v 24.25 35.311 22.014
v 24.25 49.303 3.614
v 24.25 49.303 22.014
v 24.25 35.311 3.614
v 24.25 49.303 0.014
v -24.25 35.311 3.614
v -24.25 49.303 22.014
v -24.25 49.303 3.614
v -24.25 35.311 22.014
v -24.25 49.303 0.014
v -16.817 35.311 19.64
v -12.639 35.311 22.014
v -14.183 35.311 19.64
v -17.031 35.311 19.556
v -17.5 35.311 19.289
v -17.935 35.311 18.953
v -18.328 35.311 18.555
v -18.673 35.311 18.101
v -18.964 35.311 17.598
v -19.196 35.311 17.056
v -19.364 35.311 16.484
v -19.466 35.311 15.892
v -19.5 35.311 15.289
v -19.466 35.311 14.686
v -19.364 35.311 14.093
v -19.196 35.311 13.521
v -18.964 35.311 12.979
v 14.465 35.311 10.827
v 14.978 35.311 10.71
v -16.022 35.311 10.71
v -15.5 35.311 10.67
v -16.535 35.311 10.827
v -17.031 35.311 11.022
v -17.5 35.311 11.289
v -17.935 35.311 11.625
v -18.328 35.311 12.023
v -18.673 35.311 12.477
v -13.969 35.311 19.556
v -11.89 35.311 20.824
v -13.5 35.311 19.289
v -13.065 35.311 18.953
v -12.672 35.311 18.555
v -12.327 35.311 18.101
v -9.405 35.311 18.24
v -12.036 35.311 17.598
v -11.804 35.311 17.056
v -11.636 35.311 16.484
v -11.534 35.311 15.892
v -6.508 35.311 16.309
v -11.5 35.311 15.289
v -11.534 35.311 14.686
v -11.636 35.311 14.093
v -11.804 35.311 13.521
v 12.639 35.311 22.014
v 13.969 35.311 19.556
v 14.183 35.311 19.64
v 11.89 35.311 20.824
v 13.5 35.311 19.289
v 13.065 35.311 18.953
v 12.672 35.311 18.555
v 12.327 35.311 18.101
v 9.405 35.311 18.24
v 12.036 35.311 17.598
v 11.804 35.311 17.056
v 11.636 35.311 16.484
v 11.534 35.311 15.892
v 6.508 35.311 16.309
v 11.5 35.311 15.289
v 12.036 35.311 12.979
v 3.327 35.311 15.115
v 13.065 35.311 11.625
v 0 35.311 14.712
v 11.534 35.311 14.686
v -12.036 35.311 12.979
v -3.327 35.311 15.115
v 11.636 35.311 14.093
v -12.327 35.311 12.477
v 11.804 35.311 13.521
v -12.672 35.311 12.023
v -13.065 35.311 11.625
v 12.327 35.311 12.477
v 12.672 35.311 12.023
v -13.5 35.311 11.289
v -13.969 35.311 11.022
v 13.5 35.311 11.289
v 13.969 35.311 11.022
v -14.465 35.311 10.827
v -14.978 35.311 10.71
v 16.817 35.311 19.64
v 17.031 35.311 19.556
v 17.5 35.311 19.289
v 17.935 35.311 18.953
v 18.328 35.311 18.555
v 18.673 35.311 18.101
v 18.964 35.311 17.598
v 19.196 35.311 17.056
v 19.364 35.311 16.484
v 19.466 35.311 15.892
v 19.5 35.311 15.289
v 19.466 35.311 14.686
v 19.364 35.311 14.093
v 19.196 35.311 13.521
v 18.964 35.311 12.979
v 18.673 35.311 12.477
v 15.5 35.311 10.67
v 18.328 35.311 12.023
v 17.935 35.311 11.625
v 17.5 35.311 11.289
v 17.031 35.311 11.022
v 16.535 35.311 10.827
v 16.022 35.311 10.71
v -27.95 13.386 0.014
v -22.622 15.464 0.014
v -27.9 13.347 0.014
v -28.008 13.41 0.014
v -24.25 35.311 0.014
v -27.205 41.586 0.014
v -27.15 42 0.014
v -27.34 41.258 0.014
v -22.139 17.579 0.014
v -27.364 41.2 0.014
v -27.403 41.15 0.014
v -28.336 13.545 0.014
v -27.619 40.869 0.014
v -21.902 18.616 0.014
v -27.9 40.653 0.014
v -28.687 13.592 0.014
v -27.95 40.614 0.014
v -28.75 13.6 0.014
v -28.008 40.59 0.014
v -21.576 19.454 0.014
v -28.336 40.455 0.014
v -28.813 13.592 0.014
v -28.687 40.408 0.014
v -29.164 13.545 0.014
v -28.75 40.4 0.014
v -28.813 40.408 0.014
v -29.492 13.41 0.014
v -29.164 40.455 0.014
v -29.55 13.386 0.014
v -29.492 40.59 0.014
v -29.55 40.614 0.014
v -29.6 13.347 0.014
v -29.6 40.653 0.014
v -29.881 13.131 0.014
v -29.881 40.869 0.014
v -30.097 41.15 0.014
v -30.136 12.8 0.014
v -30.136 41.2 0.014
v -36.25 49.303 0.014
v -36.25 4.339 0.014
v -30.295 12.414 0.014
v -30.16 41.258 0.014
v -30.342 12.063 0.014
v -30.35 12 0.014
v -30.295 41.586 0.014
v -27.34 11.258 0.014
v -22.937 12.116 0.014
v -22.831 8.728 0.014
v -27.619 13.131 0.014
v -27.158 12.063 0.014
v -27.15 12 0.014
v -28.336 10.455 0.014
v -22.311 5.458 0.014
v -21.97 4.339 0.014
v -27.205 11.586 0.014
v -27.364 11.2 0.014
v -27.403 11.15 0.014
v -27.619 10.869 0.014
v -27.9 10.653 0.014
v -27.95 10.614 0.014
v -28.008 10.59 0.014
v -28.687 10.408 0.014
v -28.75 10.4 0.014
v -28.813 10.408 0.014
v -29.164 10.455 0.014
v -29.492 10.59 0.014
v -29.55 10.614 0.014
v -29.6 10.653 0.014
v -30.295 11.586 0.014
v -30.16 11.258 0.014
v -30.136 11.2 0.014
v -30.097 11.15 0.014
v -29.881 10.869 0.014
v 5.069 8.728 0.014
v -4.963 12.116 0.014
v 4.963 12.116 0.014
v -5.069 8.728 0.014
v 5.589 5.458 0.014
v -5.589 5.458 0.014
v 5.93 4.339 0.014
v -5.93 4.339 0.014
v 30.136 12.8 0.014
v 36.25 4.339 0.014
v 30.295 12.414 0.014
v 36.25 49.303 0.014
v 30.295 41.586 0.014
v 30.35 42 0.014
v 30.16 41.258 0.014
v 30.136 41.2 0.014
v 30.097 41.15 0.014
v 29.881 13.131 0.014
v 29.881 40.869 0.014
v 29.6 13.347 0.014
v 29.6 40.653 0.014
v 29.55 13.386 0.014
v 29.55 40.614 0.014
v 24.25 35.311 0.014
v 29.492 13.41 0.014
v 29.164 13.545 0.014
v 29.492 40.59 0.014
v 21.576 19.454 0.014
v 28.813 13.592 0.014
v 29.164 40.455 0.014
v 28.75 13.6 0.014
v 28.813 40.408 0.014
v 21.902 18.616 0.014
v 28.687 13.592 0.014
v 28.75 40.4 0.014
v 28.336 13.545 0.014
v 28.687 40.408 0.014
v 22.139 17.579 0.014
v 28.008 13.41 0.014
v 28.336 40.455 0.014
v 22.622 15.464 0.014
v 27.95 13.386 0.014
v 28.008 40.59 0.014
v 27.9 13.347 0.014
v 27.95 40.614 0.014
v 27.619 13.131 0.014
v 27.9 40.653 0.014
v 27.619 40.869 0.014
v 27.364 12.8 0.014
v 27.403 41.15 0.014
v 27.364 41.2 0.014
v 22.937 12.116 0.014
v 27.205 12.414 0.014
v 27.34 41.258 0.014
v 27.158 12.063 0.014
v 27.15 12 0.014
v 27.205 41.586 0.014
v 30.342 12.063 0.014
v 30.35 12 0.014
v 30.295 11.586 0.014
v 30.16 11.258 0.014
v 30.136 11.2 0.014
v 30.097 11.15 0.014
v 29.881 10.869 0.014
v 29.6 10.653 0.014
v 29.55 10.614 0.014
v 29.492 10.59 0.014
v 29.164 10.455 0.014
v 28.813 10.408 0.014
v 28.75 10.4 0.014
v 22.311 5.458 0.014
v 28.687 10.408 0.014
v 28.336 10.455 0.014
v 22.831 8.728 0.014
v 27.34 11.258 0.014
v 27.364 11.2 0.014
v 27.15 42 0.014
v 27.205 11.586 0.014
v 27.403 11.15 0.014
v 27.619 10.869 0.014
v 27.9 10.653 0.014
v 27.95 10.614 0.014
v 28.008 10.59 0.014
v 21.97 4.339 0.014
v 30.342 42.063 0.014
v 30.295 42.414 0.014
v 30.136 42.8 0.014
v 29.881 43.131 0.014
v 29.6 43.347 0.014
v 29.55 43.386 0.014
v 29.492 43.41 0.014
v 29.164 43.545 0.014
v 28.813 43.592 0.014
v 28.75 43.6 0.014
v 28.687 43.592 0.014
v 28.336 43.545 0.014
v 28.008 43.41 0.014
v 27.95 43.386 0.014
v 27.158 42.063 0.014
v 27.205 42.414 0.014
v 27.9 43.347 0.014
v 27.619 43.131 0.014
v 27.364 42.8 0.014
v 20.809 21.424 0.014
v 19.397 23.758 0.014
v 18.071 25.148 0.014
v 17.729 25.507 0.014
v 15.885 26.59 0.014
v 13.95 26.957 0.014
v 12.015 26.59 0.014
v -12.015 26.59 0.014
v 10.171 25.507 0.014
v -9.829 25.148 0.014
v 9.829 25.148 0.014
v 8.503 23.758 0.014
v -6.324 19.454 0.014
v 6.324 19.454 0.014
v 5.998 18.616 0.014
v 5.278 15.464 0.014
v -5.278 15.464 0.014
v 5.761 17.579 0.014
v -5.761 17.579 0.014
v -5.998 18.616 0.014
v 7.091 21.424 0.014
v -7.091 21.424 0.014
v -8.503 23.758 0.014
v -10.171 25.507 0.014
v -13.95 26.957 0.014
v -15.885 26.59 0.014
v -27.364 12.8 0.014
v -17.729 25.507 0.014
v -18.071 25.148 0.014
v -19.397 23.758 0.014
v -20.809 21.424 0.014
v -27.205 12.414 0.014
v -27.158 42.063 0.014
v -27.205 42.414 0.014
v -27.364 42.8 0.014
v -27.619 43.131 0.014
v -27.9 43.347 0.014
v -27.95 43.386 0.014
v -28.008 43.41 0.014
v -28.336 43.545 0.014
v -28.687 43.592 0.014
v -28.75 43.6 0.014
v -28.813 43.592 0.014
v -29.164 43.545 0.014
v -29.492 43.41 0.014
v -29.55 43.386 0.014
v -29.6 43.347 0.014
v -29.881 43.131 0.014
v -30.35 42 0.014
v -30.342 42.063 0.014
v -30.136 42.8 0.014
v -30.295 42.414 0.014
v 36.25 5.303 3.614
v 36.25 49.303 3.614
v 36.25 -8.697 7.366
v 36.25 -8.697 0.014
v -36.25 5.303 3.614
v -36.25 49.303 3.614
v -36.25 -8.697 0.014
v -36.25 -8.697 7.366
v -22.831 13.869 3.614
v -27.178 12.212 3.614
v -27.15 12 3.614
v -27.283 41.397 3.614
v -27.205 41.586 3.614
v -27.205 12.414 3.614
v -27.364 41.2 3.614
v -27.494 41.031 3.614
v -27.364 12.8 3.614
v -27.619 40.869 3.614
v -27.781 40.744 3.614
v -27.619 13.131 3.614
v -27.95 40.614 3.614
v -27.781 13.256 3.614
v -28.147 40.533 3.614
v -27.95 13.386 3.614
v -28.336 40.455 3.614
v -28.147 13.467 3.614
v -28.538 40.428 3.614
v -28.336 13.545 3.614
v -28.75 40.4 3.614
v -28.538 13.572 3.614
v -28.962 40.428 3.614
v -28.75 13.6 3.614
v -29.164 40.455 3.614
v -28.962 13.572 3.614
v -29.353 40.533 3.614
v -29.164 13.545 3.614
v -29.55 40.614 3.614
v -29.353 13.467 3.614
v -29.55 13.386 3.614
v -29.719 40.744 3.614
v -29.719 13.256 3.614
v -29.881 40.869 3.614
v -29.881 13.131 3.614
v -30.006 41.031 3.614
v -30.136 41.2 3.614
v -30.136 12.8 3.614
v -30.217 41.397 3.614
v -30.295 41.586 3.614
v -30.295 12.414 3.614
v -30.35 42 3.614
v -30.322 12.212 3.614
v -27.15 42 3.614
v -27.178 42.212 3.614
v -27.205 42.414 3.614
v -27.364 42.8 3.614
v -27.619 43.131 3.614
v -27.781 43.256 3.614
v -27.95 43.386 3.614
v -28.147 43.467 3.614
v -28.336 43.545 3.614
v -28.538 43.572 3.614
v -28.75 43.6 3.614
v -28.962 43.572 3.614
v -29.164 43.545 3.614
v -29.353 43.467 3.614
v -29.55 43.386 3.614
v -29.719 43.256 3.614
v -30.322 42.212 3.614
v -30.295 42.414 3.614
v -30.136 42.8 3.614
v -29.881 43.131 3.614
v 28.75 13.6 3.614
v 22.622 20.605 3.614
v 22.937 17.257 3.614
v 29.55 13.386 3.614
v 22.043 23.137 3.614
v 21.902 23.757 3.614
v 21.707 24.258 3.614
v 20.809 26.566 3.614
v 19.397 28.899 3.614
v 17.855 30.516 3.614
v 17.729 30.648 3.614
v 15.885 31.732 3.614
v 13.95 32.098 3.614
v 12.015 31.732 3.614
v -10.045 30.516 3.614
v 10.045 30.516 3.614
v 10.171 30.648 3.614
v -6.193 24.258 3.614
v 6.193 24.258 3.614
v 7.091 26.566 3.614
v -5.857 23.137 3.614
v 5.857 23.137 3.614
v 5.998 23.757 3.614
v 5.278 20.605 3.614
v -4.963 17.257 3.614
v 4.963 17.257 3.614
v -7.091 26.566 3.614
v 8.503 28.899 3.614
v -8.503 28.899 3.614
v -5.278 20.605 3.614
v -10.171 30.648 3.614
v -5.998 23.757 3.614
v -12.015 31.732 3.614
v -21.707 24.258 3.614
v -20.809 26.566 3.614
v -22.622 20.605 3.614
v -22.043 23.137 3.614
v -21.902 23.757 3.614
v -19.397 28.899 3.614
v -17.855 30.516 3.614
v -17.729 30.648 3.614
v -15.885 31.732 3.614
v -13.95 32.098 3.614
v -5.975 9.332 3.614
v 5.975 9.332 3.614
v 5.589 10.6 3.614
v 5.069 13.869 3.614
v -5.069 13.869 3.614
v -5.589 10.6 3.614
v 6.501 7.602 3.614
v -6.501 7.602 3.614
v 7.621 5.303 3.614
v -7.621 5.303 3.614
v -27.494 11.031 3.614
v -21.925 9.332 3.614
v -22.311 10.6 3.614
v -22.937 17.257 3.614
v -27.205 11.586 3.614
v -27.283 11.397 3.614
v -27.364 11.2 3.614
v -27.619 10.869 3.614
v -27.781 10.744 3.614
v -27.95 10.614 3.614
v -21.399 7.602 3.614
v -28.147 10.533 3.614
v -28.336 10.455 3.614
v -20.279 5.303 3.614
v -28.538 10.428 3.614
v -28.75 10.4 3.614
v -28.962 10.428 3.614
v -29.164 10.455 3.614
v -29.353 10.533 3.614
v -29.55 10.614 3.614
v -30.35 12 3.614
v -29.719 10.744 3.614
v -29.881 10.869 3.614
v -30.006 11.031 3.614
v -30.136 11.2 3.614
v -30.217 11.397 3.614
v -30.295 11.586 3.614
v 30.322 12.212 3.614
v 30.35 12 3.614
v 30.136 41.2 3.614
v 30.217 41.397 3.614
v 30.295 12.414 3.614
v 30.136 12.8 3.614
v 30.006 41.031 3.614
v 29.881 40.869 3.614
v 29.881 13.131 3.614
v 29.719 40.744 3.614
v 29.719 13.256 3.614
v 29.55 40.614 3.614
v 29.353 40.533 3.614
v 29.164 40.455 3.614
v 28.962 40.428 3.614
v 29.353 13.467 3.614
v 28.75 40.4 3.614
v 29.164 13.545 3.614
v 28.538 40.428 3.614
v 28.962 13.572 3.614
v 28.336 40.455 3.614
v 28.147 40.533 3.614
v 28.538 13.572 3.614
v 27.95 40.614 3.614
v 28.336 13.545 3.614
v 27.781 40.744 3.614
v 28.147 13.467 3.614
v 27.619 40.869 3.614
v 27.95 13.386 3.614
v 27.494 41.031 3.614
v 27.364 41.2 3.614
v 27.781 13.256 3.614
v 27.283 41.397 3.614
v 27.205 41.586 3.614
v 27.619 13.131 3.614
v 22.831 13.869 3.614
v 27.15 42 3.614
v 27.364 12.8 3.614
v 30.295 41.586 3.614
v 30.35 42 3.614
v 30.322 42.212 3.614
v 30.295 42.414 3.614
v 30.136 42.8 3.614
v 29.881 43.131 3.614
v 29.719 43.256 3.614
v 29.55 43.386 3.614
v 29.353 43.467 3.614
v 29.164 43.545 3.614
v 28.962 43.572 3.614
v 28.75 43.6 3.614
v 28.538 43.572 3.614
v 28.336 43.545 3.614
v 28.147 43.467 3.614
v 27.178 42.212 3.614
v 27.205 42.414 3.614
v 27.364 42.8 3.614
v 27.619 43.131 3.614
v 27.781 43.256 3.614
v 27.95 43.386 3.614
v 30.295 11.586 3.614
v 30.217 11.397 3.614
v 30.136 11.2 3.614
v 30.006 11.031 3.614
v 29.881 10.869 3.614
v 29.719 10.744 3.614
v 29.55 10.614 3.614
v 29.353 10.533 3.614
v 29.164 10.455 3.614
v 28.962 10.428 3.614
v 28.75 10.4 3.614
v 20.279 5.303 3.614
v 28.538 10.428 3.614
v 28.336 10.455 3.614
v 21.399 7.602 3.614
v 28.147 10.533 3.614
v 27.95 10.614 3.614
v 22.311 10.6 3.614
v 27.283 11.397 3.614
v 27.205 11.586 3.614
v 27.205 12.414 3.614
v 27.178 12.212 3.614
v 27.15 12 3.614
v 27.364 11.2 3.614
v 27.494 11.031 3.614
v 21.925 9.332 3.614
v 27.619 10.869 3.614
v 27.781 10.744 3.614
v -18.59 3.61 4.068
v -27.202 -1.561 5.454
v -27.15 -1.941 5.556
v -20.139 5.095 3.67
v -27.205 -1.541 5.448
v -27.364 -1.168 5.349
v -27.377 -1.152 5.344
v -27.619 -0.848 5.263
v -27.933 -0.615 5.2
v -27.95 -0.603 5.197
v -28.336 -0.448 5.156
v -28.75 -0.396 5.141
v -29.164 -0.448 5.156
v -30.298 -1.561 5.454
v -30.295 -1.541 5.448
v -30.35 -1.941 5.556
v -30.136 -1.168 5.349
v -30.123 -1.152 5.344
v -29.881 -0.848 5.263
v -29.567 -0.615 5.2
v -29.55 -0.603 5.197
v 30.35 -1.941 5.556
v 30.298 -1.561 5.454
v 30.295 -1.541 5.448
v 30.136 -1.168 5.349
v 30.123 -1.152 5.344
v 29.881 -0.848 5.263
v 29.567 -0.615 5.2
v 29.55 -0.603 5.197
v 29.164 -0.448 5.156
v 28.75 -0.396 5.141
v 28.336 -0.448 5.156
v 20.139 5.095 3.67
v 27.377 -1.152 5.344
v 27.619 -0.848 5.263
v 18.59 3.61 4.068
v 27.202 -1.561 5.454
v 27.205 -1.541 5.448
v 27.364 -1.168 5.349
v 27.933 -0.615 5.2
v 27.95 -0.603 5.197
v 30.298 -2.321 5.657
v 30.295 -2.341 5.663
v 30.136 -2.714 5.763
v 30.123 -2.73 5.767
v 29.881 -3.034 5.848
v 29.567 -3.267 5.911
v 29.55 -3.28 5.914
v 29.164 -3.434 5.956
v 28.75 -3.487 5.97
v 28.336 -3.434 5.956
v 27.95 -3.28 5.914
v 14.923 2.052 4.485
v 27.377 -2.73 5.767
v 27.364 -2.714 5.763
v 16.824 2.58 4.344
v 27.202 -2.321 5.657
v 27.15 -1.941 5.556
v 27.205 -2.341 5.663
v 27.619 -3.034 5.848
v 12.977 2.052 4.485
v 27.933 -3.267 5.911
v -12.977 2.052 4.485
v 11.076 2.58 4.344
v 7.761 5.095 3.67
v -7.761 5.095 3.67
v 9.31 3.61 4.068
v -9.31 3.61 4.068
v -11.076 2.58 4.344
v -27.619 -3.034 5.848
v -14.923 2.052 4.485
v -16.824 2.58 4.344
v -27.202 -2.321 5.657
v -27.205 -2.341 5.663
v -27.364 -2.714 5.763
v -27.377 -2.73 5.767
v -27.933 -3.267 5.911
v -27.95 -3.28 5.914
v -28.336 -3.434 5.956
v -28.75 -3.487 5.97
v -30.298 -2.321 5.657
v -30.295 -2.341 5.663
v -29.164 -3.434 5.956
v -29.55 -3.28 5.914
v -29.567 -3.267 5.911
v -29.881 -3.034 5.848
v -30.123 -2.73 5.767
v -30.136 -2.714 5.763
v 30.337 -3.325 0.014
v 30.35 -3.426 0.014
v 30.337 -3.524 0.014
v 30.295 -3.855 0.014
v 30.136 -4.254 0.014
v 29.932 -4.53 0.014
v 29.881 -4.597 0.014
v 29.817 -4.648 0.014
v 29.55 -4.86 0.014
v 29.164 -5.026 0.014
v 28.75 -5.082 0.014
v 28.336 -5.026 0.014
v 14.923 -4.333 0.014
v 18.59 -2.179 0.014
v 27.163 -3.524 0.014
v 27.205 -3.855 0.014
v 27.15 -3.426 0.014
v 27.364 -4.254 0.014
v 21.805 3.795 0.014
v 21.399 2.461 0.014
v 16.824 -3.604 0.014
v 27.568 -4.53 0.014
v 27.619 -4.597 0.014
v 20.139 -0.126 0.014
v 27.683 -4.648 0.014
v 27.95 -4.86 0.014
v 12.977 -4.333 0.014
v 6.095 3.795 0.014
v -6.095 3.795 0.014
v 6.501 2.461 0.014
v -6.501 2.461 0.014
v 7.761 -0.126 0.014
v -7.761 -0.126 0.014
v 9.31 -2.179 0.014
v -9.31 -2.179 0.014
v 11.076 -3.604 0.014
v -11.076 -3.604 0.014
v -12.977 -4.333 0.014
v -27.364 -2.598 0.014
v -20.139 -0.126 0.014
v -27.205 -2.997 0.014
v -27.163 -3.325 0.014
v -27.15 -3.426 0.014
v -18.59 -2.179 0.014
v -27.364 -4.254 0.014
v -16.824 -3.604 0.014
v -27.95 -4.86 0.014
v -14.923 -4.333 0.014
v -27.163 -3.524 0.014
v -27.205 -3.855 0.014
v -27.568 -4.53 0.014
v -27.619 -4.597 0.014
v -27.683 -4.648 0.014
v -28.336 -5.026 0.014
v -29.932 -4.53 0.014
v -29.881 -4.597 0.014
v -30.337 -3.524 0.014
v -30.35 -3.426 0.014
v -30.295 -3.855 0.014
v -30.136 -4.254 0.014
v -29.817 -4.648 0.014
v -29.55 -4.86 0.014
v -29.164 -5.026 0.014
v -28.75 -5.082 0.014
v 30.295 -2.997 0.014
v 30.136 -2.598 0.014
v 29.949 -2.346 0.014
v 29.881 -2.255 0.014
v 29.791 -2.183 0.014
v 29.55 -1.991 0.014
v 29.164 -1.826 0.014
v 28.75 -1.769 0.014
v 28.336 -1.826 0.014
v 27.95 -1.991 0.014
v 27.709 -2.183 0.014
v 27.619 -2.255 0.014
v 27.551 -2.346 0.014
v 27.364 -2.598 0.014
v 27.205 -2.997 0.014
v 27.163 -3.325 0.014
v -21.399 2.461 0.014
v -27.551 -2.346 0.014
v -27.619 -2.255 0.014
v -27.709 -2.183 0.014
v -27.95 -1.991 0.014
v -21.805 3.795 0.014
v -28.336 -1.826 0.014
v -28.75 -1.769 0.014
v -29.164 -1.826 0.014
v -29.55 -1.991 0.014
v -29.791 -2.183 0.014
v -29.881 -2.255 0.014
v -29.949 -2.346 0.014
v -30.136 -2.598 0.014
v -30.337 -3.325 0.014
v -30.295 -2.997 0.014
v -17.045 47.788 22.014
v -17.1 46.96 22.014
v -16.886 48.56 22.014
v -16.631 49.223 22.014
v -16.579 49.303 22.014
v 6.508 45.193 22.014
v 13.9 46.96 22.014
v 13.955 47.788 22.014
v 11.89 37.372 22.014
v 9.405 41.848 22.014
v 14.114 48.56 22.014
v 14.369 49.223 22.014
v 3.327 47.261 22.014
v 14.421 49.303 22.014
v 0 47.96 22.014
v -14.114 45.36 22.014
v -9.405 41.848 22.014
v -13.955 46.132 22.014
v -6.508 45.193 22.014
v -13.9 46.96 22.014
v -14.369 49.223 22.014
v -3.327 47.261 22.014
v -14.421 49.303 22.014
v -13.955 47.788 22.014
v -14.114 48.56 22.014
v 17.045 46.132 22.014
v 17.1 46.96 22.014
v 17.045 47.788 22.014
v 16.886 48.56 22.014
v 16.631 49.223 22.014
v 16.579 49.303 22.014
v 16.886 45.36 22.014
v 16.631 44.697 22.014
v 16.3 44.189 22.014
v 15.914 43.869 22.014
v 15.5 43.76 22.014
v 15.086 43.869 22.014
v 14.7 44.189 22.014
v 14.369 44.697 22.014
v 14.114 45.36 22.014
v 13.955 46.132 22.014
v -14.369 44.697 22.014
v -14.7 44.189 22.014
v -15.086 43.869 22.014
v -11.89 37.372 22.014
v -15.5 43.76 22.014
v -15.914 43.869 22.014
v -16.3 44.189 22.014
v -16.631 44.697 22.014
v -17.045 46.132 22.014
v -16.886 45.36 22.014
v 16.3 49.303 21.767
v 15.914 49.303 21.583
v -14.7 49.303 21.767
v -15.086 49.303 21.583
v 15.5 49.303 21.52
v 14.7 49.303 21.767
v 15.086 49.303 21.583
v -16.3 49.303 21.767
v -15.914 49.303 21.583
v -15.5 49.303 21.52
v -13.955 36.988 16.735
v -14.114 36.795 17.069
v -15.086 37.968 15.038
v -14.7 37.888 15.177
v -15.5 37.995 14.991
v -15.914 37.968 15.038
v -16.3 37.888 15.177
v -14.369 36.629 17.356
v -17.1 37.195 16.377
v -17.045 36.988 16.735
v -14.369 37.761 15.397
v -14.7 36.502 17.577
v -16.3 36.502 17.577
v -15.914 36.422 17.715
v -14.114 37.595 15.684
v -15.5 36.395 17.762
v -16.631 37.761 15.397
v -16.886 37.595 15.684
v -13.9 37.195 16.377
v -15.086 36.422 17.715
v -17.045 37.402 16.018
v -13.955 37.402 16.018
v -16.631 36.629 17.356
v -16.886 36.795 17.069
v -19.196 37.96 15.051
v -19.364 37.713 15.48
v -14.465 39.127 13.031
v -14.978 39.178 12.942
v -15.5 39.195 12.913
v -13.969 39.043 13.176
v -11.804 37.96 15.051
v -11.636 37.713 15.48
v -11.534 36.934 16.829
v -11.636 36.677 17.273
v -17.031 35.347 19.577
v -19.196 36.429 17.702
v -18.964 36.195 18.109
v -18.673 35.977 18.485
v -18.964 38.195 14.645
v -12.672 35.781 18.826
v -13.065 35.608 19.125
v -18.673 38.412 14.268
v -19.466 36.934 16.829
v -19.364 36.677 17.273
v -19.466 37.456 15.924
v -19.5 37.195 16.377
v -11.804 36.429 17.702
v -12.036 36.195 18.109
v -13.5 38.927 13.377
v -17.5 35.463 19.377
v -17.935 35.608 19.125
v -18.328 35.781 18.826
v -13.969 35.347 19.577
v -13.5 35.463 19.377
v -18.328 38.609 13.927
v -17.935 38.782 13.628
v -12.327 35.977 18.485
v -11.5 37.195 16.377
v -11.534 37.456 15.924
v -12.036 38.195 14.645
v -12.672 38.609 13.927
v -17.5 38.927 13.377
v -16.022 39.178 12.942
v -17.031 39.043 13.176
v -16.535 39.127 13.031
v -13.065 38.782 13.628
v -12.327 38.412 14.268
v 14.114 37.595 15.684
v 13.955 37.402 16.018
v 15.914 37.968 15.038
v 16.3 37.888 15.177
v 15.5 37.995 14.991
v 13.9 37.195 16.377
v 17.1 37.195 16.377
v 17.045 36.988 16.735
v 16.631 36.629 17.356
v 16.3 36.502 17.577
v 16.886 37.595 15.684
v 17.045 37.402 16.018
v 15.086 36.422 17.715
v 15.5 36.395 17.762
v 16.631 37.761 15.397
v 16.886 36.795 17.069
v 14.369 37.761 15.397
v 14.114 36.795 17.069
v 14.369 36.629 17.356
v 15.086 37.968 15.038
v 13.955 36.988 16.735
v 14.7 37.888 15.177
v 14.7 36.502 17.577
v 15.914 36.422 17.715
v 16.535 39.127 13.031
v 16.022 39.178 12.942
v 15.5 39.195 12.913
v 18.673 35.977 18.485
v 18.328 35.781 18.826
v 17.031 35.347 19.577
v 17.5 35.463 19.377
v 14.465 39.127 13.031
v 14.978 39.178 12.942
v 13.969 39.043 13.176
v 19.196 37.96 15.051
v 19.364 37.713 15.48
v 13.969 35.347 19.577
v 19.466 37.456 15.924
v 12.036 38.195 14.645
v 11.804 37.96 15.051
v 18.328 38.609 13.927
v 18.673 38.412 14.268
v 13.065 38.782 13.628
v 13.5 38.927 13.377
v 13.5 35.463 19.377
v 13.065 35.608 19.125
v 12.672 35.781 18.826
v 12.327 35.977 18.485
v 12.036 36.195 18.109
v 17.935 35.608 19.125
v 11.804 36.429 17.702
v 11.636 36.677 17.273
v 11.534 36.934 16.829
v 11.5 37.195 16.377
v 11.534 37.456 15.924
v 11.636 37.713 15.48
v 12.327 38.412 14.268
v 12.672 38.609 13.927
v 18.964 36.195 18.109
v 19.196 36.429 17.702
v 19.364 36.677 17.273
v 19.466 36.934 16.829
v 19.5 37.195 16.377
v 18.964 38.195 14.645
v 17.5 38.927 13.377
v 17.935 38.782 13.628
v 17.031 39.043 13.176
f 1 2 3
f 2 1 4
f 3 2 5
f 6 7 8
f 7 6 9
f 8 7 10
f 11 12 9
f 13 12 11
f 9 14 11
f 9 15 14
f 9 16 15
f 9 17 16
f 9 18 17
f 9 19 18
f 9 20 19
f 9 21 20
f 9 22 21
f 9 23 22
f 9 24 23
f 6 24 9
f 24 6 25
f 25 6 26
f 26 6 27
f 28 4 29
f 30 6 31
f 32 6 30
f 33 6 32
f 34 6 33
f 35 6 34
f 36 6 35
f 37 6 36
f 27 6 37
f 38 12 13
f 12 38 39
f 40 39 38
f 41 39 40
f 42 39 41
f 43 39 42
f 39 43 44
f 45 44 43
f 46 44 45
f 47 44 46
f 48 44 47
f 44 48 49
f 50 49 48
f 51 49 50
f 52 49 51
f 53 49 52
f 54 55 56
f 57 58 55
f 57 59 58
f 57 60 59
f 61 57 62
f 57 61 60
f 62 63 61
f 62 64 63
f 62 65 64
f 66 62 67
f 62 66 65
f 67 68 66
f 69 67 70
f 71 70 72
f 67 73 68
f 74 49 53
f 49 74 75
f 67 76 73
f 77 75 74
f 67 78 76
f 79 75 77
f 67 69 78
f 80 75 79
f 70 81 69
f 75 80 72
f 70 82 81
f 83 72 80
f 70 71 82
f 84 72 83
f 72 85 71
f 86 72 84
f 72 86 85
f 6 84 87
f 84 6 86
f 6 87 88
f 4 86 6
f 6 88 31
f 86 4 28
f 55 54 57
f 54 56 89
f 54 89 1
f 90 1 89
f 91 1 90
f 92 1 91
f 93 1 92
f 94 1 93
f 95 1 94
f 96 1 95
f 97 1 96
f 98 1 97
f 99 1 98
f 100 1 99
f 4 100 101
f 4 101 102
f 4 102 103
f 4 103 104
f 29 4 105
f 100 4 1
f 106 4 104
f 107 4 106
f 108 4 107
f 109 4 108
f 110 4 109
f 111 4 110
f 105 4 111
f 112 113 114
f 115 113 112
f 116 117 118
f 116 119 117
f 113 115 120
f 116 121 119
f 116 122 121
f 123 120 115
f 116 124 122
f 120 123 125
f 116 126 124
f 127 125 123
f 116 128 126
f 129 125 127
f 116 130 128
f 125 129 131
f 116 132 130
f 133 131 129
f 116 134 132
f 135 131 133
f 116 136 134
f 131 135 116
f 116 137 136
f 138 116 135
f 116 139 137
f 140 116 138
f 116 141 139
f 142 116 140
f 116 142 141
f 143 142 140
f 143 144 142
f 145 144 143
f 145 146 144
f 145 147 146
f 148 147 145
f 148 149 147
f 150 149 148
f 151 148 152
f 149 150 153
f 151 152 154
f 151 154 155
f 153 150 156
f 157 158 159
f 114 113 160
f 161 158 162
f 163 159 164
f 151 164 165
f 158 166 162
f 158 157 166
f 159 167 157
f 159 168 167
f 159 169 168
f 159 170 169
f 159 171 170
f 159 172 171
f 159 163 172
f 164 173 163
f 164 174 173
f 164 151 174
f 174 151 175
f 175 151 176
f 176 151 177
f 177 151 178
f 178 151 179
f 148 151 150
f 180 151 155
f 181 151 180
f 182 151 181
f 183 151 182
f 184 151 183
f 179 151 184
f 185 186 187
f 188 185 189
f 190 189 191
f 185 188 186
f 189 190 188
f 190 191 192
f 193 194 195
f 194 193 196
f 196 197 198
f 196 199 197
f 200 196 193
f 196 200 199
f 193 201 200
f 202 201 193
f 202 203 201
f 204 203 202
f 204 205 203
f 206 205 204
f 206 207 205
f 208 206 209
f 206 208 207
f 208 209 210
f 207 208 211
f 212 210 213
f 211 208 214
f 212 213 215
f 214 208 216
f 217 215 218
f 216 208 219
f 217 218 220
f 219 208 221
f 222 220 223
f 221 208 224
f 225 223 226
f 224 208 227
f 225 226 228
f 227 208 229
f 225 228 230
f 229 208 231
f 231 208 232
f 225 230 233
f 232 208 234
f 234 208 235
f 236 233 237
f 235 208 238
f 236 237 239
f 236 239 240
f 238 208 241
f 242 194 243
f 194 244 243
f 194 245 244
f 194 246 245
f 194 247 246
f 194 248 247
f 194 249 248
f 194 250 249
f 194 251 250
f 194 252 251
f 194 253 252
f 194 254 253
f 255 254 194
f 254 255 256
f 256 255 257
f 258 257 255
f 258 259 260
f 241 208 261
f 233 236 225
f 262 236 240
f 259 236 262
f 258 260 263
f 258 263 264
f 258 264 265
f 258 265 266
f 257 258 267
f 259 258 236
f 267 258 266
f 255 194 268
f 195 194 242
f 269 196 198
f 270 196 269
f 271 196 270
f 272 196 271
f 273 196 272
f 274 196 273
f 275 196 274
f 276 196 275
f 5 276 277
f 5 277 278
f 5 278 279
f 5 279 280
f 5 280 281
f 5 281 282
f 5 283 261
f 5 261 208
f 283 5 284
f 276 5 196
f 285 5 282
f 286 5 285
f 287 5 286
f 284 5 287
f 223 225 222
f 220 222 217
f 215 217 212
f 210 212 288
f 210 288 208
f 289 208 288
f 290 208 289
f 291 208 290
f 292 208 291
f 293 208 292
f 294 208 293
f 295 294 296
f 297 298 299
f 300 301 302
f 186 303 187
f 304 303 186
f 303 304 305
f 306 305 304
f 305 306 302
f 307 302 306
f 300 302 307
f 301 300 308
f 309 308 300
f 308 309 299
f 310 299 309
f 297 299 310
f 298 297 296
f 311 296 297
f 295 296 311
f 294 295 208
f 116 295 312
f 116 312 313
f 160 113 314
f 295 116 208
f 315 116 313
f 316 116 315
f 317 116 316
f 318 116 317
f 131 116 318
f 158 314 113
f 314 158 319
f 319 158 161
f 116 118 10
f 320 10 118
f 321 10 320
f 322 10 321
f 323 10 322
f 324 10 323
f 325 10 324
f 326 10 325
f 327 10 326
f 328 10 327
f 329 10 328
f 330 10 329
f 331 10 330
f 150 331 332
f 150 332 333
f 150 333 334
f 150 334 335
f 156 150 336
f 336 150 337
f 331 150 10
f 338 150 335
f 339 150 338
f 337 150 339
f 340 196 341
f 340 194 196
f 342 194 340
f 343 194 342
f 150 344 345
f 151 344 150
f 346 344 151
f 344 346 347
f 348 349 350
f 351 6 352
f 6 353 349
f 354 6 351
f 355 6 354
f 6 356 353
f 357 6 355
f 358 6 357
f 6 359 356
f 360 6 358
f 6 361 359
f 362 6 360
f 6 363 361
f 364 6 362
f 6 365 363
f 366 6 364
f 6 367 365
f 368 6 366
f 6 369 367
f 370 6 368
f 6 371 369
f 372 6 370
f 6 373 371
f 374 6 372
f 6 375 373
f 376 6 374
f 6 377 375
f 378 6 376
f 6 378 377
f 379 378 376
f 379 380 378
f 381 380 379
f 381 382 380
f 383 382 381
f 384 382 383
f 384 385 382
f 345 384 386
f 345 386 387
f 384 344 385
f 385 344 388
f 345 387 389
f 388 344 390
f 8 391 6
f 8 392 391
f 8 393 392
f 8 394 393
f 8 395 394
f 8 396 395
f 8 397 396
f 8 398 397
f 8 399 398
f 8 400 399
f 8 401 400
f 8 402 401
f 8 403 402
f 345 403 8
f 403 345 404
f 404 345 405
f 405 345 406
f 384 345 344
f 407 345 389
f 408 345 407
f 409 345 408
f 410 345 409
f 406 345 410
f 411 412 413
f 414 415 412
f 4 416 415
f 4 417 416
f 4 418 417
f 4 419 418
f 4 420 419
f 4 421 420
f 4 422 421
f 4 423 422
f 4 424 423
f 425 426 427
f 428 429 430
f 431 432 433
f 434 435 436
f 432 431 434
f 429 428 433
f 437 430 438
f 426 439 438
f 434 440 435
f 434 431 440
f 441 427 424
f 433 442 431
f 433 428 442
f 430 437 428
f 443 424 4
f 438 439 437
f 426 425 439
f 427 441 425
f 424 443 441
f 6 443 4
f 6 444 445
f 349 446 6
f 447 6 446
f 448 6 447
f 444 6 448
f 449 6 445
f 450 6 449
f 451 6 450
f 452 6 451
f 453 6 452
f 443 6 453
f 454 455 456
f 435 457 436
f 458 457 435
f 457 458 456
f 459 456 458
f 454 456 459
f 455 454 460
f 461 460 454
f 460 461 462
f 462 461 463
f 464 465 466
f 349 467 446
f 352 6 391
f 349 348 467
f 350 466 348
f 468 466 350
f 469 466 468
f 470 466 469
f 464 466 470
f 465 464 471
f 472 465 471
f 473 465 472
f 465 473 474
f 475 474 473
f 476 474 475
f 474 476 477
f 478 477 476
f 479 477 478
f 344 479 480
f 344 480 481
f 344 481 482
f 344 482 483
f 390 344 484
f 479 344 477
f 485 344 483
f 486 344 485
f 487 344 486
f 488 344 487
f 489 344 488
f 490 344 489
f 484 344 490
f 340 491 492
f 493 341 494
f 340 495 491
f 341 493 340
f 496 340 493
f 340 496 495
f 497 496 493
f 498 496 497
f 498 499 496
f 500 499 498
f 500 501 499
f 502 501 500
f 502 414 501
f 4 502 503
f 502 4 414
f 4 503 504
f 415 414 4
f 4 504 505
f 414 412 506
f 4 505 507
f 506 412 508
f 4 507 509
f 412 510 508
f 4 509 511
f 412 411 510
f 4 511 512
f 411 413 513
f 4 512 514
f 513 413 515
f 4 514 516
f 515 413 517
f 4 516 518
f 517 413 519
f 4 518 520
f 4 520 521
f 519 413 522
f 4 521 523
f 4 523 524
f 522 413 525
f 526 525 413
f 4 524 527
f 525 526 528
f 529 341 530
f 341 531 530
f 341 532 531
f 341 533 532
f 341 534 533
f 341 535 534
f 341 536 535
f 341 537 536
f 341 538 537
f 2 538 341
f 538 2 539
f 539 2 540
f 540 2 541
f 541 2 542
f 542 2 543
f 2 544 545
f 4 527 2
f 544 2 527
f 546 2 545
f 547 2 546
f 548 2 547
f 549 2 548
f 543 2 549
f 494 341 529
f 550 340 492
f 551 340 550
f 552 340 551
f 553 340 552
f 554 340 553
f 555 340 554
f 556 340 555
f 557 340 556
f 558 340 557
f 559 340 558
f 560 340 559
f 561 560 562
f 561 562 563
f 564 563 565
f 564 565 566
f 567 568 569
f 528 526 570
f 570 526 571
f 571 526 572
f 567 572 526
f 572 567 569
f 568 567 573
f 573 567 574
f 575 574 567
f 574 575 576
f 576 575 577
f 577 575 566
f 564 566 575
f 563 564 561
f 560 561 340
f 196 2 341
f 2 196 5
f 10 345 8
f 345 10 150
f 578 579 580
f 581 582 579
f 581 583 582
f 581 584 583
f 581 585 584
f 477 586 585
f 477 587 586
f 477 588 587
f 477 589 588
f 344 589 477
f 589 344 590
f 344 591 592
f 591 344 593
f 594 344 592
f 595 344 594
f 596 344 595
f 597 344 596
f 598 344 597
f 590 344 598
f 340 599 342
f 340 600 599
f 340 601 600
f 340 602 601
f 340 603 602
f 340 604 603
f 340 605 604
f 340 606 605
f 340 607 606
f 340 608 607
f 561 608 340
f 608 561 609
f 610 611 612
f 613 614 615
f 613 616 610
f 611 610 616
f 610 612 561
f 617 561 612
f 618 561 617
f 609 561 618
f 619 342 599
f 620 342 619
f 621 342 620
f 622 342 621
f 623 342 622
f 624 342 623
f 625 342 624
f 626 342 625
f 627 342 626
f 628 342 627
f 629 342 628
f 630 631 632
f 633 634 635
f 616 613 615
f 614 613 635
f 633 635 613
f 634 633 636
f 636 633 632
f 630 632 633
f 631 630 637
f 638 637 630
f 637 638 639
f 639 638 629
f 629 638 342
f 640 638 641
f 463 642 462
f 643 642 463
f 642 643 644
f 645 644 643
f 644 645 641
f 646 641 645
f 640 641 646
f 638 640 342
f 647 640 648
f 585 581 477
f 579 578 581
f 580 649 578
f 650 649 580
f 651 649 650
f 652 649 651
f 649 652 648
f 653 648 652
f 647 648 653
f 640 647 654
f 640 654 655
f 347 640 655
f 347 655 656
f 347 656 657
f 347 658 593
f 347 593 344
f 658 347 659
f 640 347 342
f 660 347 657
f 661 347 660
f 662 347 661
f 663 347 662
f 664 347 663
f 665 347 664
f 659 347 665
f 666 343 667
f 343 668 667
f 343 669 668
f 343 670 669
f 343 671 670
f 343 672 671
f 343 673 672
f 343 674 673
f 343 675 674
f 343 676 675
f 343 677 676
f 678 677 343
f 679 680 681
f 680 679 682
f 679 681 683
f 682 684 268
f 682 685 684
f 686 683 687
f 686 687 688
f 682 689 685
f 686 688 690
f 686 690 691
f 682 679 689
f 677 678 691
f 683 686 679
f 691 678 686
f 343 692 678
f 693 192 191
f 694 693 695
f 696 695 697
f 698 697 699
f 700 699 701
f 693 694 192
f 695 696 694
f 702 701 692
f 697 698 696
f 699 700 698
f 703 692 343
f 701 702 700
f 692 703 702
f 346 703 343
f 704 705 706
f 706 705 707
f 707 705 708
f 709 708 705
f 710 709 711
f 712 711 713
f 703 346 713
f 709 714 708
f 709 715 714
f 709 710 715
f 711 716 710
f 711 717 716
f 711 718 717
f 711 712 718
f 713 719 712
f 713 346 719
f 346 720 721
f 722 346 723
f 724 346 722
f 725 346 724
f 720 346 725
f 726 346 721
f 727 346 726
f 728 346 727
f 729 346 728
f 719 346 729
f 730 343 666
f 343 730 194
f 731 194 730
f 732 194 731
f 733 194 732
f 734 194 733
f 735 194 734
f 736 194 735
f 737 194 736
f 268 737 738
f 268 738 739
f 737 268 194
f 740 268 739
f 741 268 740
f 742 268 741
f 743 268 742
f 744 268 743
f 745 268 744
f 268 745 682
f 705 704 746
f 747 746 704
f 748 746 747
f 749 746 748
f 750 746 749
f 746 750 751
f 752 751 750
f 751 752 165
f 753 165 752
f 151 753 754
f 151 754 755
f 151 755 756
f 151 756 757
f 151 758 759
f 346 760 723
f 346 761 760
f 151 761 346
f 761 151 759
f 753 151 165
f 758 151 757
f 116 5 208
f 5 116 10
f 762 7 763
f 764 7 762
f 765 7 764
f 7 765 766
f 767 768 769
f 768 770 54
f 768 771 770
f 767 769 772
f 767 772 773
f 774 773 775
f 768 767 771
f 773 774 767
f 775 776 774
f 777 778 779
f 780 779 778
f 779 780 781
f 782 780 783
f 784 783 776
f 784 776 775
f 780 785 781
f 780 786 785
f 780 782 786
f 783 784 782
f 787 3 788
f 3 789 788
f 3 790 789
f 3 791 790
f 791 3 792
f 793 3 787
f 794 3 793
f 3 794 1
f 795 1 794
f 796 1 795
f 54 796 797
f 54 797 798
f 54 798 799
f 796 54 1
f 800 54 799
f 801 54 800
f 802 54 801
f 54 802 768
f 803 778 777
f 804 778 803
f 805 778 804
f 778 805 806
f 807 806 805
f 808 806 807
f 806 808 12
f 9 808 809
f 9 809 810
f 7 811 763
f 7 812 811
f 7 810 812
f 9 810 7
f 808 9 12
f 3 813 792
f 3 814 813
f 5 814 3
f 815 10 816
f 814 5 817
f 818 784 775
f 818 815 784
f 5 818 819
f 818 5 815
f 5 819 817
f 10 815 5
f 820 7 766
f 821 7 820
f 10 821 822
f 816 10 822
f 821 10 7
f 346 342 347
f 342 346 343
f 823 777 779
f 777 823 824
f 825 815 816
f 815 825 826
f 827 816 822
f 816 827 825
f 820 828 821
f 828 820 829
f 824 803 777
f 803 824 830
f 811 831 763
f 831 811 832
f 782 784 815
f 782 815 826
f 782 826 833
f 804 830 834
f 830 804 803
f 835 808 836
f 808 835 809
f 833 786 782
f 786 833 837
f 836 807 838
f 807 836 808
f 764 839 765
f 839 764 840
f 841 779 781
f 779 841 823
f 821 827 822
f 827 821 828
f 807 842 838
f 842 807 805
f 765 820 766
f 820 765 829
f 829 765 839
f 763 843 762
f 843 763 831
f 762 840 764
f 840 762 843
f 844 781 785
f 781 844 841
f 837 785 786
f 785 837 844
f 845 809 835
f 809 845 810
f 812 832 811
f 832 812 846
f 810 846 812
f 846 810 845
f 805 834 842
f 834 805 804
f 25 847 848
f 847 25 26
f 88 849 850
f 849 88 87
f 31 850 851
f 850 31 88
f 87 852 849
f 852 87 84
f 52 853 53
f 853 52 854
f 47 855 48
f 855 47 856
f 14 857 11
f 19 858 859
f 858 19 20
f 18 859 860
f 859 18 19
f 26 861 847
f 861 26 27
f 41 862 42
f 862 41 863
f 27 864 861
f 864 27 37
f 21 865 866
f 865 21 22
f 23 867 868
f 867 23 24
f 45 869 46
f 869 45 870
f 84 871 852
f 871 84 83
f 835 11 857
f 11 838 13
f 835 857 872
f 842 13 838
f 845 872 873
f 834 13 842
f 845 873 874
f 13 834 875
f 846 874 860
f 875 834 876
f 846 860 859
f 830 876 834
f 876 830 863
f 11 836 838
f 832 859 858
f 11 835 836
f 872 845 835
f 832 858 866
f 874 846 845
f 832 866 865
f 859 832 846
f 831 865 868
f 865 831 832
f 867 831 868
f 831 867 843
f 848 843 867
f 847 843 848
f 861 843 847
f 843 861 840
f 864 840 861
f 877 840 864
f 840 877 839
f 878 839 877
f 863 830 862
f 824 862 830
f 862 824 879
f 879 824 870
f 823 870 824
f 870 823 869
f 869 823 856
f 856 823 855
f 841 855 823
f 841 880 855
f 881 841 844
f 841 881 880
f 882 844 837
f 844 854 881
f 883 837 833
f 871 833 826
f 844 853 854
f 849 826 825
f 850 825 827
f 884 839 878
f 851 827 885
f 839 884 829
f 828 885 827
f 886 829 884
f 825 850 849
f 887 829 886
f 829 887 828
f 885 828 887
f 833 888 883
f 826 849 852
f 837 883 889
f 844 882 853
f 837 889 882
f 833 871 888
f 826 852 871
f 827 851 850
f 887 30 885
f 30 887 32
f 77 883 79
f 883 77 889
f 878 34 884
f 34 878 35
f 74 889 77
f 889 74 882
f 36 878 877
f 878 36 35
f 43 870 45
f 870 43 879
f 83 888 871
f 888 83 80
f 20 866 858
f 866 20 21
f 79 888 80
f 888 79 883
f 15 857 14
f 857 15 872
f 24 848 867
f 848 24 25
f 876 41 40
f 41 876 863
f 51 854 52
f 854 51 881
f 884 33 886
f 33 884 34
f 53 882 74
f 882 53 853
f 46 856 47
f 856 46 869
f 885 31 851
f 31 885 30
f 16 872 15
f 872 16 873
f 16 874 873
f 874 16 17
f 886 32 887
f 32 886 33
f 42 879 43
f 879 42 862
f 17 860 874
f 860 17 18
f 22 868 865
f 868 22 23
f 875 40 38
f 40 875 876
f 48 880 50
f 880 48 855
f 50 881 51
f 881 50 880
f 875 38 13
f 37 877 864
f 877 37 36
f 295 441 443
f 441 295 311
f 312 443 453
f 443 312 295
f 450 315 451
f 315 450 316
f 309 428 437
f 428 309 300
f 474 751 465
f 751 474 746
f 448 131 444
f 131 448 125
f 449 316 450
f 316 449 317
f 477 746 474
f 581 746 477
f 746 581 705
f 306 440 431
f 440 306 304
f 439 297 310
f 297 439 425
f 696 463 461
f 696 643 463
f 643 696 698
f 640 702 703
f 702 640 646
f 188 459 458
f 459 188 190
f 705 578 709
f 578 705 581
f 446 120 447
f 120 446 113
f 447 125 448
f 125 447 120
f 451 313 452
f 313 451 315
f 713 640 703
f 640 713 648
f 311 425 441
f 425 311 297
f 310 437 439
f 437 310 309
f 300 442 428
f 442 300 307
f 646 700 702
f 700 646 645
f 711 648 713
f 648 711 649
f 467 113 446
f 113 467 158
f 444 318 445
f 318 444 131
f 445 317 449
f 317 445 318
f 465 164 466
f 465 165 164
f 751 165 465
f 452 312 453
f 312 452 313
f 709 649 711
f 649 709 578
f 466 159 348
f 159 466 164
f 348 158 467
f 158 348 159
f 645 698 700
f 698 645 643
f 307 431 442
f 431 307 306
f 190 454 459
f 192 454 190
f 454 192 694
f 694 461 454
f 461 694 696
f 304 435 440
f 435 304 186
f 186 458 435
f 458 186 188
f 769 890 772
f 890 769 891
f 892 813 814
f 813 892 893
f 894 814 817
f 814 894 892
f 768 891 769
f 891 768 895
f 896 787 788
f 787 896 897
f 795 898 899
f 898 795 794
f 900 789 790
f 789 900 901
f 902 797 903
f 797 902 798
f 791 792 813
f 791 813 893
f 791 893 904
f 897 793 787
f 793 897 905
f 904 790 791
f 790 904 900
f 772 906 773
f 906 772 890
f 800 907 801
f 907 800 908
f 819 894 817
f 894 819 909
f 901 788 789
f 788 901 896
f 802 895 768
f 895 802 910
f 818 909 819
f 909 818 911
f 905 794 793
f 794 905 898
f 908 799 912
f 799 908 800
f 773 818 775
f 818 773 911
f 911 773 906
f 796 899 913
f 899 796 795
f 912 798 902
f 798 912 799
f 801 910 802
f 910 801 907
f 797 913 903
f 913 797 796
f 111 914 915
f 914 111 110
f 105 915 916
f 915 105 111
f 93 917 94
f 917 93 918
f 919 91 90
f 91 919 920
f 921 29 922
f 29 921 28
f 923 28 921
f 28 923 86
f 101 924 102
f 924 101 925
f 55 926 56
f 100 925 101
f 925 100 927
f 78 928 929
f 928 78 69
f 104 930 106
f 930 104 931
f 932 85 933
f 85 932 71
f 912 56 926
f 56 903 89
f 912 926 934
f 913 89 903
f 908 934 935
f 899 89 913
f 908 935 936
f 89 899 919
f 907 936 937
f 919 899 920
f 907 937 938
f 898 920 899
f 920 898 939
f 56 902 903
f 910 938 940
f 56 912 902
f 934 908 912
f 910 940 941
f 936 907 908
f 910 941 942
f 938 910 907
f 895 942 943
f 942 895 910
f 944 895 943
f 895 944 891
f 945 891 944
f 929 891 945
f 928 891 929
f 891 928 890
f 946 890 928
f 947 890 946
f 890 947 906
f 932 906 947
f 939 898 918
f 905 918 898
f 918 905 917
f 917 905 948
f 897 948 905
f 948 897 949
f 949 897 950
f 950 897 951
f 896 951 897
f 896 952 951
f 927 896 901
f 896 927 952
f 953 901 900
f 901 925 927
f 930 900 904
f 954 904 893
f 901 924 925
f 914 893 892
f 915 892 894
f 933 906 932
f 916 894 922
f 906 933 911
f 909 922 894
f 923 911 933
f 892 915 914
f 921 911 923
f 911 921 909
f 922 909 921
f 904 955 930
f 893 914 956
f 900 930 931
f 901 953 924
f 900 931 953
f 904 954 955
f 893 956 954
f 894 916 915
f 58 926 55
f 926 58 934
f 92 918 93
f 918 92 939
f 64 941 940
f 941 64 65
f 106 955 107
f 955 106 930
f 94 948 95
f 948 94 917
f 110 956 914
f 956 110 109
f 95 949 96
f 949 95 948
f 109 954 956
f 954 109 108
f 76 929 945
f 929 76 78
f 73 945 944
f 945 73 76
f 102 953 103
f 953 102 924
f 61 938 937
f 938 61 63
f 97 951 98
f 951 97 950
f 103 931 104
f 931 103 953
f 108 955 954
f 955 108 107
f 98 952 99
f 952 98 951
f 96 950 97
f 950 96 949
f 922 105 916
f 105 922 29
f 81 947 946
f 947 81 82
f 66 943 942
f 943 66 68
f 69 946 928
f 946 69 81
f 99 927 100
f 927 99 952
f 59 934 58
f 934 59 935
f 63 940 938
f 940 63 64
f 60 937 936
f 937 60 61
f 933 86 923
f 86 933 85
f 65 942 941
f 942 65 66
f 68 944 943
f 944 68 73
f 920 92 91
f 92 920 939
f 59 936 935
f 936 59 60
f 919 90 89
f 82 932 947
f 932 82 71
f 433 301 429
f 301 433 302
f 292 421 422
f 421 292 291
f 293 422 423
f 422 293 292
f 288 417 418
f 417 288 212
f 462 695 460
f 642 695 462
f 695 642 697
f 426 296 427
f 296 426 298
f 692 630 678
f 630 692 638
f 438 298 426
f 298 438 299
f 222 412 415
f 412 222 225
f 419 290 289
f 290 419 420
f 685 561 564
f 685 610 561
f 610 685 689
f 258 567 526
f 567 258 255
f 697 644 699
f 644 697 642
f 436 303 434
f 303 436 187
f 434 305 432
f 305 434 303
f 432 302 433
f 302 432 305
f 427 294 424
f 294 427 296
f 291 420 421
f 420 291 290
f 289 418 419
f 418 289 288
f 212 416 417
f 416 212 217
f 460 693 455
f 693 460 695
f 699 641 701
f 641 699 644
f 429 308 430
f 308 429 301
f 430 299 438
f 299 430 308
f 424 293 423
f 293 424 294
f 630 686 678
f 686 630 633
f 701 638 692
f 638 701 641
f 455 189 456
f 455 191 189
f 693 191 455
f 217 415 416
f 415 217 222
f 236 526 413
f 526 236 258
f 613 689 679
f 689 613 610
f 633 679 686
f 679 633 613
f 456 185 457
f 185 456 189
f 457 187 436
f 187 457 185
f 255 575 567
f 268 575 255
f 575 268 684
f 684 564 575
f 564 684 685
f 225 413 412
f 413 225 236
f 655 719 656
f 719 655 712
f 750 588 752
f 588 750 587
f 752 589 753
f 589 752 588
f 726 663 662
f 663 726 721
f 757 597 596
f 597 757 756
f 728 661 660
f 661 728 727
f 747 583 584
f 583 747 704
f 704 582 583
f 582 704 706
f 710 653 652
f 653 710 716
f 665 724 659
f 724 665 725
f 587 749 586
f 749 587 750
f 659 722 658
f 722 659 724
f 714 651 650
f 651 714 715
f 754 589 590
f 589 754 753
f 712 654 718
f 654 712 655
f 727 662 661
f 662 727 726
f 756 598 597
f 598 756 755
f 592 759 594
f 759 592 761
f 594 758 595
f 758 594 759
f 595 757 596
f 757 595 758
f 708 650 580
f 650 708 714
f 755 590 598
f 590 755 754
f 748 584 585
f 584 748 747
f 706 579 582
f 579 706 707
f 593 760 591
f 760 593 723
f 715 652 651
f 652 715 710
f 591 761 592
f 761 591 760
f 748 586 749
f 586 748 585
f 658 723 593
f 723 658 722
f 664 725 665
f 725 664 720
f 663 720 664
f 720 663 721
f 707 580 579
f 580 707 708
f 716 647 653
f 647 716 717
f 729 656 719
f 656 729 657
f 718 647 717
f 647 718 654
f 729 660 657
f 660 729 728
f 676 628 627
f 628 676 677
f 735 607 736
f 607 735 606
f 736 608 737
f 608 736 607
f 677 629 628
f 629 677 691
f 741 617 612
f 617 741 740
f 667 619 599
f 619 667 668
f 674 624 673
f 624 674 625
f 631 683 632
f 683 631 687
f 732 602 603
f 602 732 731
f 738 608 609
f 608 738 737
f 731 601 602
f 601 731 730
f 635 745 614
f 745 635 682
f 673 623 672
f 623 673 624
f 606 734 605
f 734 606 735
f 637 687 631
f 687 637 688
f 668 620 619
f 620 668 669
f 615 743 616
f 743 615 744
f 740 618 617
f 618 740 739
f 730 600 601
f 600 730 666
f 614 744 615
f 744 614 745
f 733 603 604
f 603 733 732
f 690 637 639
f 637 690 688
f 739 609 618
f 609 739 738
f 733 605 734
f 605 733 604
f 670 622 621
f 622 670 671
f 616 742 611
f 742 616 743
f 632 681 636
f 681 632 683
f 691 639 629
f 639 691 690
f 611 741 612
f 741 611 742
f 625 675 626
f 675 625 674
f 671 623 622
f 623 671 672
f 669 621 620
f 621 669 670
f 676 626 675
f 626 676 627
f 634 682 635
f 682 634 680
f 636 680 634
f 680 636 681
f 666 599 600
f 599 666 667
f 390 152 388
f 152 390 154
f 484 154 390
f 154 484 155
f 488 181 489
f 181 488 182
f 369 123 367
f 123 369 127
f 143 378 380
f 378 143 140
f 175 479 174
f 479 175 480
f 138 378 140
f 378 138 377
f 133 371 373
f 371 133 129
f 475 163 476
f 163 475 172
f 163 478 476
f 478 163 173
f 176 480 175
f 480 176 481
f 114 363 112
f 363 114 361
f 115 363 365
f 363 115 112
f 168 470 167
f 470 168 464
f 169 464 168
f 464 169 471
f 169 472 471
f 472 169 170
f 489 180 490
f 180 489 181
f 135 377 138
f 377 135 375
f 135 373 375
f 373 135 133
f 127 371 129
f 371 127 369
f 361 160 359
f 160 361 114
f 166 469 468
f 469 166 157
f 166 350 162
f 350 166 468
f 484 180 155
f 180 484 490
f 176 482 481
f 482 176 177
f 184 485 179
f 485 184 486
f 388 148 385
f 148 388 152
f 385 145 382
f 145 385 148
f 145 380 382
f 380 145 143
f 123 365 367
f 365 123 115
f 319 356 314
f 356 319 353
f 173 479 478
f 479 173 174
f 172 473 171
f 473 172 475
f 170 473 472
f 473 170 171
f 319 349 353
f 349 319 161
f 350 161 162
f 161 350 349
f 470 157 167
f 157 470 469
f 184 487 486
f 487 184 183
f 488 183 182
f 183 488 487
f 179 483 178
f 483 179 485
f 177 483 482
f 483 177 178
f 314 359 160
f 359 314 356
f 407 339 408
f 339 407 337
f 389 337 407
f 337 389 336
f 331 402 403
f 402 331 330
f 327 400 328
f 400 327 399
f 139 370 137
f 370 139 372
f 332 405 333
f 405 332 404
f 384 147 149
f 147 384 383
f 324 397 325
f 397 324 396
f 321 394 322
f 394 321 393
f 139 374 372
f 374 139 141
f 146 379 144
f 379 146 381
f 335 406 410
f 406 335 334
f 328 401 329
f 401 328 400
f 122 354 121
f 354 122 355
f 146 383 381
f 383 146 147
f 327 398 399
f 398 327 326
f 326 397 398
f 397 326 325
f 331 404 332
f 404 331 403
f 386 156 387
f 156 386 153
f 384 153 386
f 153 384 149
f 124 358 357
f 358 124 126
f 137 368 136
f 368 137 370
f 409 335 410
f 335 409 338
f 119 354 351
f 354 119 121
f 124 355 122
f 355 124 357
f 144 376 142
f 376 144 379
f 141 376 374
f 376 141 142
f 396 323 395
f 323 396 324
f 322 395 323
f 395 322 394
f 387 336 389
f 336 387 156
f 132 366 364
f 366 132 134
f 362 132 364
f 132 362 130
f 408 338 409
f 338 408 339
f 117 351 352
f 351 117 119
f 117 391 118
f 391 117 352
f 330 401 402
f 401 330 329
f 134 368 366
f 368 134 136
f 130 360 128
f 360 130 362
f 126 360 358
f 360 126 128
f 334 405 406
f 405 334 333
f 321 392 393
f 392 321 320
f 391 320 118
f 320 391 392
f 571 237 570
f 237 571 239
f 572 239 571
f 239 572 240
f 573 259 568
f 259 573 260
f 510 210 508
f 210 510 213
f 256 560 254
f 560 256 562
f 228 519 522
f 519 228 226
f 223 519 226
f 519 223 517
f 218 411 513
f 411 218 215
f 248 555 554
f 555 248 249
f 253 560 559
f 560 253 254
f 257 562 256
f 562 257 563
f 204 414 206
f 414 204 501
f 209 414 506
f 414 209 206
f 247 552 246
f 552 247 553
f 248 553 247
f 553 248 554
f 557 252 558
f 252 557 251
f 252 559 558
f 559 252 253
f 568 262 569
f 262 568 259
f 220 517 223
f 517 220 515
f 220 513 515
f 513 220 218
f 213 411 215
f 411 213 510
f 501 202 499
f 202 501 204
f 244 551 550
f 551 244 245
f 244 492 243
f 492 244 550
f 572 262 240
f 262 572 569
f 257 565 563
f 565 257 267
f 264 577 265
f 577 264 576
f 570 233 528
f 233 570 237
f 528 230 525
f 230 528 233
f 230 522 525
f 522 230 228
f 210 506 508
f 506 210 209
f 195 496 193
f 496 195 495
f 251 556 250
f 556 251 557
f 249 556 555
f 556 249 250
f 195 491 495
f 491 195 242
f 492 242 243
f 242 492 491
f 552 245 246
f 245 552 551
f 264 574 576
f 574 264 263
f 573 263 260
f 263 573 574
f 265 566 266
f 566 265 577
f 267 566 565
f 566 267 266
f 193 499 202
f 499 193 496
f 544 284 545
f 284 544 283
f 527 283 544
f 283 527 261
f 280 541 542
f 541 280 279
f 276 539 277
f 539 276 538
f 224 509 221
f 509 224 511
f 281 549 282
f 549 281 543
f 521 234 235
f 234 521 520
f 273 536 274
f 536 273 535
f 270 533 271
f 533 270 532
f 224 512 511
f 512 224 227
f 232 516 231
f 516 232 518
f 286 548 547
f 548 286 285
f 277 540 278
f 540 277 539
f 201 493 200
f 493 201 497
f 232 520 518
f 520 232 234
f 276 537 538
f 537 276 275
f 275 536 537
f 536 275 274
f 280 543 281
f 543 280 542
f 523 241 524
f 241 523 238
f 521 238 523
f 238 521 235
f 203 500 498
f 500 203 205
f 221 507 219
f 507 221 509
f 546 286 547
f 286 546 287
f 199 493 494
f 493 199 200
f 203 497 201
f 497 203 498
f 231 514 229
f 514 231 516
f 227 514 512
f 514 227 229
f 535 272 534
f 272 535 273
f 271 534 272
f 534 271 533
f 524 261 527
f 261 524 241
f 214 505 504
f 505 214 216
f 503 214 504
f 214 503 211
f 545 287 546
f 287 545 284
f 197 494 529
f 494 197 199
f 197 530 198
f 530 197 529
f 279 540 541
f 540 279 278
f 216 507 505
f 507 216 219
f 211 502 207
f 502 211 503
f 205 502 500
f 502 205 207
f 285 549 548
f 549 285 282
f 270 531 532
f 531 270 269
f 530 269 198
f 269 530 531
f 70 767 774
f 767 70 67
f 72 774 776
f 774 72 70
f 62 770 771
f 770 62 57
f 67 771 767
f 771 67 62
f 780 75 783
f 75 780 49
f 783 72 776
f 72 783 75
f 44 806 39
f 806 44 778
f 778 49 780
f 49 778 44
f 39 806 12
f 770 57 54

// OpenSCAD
// file: configuration.scad
// Increase this if your slicer or printer make holes too tight.
extra_radius = 0.2;

// OD = outside diameter, corner to corner.
m3_nut_od = 6.1;
m3_nut_radius = m3_nut_od/2 + 0.2 + extra_radius;

// Major diameter of metric 3mm thread.
m3_major = 2.85;
m3_radius = m3_major/2 + extra_radius;
m3_wide_radius = m3_major/2 + 0.2 + extra_radius;

// NEMA17 stepper motors.
motor_shaft_diameter = 5;
motor_shaft_radius = motor_shaft_diameter/2 + extra_radius;

// Frame brackets.
thickness = 3.6;
// main file
include <configuration.scad>;

motor_screws = 31; // mm center-to-center
motor_width = 42.5; // mm total motor face width
motor_height = 15; // mm bracket height
motor_length = 12; // mm bracket length
motor_screws_height = (motor_width - motor_screws) / 2;
motor_offset = 40; // mm from motor face to OpenBeam center
motor_thickness = 5; // mm bracket thickness

height = 15 + motor_width + 15;
diagonal = 15*sqrt(2);

module frame_motor() {
  difference() {
    intersection() {
      translate([diagonal/2, 0, 0]) rotate([0, 0, -30])
	translate([thickness-11, 15, 0])
	cube([22, 58, height], center=true);
      union() {
	translate([diagonal/2, 0, 0]) rotate([0, 0, -30])
	  translate([thickness/2, 20, 0])
	  cube([thickness, 48, height], center=true);
	intersection() {
	  translate([30, motor_offset-15, 0])
	    rotate([0, 0, 30])
	    cylinder(r=30, h=motor_width+6, $fn=6, center=true);
	  translate([25, 35, 0]) rotate([0, 0, -30])
	    cube([50, 15, 60], center=true);
	}
	rotate([0, 0, -45])
	  translate([15, 0, 0])
	  cube([15, 15, height], center=true);
      }
    }
    // Motor center cutout.
    translate([0, motor_offset, 0]) rotate([90, 0, 0])
      cylinder(r=16, h=40, center=true);
    // Motor mounting screw holes.
    for (z = [-1, 1]) {
      translate([motor_screws/2, motor_offset, z*motor_screws/2])
	rotate([90, 0, 0])
	cylinder(r=1.6, h=30, center=true, $fn=24);
      translate([motor_screws/2, motor_offset-11, z*motor_screws/2])
	rotate([90, 0, 0])
	cylinder(r=4, h=10, center=true, $fn=48);
      translate([17, 0, z*motor_screws*0.45])
	rotate([90, 0, 5])
	cylinder(r=9, h=50, center=true);
    }
    // Vertical OpenBeam mounting screw holes.
    for (z = [-1, 1]) {
      translate([0, 0, z*(height-15)/2])
	rotate([90, 0, 45])
	translate([0, 0, 7.5+thickness]) {
	cylinder(r=1.6, h=8, $fn=24, center=true);
      }
    }
    // Horizontal OpenBeam mounting screw holes.
    for (z = [-1, 1]) {
      for (y = [12, 42]) {
	rotate([0, 0, -30])
	translate([7.5+thickness/2, y, z*(height-15)/2])
	  rotate([0, 90, 0])
	  cylinder(r=1.6, h=10, $fn=24, center=true);
      }
    }
  }
}

translate([0, 0, 12.8])
rotate([0, 90, 0])
rotate([0, 0, 30])
frame_motor();

// OpenBeam.
// % rotate([0, 0, 45]) cube([15, 15, 100], center=true);

// NEMA17 stepper motor.
// translate([0, motor_offset+30, 0])
// % cube([motor_width, 60, motor_width], center=true);
